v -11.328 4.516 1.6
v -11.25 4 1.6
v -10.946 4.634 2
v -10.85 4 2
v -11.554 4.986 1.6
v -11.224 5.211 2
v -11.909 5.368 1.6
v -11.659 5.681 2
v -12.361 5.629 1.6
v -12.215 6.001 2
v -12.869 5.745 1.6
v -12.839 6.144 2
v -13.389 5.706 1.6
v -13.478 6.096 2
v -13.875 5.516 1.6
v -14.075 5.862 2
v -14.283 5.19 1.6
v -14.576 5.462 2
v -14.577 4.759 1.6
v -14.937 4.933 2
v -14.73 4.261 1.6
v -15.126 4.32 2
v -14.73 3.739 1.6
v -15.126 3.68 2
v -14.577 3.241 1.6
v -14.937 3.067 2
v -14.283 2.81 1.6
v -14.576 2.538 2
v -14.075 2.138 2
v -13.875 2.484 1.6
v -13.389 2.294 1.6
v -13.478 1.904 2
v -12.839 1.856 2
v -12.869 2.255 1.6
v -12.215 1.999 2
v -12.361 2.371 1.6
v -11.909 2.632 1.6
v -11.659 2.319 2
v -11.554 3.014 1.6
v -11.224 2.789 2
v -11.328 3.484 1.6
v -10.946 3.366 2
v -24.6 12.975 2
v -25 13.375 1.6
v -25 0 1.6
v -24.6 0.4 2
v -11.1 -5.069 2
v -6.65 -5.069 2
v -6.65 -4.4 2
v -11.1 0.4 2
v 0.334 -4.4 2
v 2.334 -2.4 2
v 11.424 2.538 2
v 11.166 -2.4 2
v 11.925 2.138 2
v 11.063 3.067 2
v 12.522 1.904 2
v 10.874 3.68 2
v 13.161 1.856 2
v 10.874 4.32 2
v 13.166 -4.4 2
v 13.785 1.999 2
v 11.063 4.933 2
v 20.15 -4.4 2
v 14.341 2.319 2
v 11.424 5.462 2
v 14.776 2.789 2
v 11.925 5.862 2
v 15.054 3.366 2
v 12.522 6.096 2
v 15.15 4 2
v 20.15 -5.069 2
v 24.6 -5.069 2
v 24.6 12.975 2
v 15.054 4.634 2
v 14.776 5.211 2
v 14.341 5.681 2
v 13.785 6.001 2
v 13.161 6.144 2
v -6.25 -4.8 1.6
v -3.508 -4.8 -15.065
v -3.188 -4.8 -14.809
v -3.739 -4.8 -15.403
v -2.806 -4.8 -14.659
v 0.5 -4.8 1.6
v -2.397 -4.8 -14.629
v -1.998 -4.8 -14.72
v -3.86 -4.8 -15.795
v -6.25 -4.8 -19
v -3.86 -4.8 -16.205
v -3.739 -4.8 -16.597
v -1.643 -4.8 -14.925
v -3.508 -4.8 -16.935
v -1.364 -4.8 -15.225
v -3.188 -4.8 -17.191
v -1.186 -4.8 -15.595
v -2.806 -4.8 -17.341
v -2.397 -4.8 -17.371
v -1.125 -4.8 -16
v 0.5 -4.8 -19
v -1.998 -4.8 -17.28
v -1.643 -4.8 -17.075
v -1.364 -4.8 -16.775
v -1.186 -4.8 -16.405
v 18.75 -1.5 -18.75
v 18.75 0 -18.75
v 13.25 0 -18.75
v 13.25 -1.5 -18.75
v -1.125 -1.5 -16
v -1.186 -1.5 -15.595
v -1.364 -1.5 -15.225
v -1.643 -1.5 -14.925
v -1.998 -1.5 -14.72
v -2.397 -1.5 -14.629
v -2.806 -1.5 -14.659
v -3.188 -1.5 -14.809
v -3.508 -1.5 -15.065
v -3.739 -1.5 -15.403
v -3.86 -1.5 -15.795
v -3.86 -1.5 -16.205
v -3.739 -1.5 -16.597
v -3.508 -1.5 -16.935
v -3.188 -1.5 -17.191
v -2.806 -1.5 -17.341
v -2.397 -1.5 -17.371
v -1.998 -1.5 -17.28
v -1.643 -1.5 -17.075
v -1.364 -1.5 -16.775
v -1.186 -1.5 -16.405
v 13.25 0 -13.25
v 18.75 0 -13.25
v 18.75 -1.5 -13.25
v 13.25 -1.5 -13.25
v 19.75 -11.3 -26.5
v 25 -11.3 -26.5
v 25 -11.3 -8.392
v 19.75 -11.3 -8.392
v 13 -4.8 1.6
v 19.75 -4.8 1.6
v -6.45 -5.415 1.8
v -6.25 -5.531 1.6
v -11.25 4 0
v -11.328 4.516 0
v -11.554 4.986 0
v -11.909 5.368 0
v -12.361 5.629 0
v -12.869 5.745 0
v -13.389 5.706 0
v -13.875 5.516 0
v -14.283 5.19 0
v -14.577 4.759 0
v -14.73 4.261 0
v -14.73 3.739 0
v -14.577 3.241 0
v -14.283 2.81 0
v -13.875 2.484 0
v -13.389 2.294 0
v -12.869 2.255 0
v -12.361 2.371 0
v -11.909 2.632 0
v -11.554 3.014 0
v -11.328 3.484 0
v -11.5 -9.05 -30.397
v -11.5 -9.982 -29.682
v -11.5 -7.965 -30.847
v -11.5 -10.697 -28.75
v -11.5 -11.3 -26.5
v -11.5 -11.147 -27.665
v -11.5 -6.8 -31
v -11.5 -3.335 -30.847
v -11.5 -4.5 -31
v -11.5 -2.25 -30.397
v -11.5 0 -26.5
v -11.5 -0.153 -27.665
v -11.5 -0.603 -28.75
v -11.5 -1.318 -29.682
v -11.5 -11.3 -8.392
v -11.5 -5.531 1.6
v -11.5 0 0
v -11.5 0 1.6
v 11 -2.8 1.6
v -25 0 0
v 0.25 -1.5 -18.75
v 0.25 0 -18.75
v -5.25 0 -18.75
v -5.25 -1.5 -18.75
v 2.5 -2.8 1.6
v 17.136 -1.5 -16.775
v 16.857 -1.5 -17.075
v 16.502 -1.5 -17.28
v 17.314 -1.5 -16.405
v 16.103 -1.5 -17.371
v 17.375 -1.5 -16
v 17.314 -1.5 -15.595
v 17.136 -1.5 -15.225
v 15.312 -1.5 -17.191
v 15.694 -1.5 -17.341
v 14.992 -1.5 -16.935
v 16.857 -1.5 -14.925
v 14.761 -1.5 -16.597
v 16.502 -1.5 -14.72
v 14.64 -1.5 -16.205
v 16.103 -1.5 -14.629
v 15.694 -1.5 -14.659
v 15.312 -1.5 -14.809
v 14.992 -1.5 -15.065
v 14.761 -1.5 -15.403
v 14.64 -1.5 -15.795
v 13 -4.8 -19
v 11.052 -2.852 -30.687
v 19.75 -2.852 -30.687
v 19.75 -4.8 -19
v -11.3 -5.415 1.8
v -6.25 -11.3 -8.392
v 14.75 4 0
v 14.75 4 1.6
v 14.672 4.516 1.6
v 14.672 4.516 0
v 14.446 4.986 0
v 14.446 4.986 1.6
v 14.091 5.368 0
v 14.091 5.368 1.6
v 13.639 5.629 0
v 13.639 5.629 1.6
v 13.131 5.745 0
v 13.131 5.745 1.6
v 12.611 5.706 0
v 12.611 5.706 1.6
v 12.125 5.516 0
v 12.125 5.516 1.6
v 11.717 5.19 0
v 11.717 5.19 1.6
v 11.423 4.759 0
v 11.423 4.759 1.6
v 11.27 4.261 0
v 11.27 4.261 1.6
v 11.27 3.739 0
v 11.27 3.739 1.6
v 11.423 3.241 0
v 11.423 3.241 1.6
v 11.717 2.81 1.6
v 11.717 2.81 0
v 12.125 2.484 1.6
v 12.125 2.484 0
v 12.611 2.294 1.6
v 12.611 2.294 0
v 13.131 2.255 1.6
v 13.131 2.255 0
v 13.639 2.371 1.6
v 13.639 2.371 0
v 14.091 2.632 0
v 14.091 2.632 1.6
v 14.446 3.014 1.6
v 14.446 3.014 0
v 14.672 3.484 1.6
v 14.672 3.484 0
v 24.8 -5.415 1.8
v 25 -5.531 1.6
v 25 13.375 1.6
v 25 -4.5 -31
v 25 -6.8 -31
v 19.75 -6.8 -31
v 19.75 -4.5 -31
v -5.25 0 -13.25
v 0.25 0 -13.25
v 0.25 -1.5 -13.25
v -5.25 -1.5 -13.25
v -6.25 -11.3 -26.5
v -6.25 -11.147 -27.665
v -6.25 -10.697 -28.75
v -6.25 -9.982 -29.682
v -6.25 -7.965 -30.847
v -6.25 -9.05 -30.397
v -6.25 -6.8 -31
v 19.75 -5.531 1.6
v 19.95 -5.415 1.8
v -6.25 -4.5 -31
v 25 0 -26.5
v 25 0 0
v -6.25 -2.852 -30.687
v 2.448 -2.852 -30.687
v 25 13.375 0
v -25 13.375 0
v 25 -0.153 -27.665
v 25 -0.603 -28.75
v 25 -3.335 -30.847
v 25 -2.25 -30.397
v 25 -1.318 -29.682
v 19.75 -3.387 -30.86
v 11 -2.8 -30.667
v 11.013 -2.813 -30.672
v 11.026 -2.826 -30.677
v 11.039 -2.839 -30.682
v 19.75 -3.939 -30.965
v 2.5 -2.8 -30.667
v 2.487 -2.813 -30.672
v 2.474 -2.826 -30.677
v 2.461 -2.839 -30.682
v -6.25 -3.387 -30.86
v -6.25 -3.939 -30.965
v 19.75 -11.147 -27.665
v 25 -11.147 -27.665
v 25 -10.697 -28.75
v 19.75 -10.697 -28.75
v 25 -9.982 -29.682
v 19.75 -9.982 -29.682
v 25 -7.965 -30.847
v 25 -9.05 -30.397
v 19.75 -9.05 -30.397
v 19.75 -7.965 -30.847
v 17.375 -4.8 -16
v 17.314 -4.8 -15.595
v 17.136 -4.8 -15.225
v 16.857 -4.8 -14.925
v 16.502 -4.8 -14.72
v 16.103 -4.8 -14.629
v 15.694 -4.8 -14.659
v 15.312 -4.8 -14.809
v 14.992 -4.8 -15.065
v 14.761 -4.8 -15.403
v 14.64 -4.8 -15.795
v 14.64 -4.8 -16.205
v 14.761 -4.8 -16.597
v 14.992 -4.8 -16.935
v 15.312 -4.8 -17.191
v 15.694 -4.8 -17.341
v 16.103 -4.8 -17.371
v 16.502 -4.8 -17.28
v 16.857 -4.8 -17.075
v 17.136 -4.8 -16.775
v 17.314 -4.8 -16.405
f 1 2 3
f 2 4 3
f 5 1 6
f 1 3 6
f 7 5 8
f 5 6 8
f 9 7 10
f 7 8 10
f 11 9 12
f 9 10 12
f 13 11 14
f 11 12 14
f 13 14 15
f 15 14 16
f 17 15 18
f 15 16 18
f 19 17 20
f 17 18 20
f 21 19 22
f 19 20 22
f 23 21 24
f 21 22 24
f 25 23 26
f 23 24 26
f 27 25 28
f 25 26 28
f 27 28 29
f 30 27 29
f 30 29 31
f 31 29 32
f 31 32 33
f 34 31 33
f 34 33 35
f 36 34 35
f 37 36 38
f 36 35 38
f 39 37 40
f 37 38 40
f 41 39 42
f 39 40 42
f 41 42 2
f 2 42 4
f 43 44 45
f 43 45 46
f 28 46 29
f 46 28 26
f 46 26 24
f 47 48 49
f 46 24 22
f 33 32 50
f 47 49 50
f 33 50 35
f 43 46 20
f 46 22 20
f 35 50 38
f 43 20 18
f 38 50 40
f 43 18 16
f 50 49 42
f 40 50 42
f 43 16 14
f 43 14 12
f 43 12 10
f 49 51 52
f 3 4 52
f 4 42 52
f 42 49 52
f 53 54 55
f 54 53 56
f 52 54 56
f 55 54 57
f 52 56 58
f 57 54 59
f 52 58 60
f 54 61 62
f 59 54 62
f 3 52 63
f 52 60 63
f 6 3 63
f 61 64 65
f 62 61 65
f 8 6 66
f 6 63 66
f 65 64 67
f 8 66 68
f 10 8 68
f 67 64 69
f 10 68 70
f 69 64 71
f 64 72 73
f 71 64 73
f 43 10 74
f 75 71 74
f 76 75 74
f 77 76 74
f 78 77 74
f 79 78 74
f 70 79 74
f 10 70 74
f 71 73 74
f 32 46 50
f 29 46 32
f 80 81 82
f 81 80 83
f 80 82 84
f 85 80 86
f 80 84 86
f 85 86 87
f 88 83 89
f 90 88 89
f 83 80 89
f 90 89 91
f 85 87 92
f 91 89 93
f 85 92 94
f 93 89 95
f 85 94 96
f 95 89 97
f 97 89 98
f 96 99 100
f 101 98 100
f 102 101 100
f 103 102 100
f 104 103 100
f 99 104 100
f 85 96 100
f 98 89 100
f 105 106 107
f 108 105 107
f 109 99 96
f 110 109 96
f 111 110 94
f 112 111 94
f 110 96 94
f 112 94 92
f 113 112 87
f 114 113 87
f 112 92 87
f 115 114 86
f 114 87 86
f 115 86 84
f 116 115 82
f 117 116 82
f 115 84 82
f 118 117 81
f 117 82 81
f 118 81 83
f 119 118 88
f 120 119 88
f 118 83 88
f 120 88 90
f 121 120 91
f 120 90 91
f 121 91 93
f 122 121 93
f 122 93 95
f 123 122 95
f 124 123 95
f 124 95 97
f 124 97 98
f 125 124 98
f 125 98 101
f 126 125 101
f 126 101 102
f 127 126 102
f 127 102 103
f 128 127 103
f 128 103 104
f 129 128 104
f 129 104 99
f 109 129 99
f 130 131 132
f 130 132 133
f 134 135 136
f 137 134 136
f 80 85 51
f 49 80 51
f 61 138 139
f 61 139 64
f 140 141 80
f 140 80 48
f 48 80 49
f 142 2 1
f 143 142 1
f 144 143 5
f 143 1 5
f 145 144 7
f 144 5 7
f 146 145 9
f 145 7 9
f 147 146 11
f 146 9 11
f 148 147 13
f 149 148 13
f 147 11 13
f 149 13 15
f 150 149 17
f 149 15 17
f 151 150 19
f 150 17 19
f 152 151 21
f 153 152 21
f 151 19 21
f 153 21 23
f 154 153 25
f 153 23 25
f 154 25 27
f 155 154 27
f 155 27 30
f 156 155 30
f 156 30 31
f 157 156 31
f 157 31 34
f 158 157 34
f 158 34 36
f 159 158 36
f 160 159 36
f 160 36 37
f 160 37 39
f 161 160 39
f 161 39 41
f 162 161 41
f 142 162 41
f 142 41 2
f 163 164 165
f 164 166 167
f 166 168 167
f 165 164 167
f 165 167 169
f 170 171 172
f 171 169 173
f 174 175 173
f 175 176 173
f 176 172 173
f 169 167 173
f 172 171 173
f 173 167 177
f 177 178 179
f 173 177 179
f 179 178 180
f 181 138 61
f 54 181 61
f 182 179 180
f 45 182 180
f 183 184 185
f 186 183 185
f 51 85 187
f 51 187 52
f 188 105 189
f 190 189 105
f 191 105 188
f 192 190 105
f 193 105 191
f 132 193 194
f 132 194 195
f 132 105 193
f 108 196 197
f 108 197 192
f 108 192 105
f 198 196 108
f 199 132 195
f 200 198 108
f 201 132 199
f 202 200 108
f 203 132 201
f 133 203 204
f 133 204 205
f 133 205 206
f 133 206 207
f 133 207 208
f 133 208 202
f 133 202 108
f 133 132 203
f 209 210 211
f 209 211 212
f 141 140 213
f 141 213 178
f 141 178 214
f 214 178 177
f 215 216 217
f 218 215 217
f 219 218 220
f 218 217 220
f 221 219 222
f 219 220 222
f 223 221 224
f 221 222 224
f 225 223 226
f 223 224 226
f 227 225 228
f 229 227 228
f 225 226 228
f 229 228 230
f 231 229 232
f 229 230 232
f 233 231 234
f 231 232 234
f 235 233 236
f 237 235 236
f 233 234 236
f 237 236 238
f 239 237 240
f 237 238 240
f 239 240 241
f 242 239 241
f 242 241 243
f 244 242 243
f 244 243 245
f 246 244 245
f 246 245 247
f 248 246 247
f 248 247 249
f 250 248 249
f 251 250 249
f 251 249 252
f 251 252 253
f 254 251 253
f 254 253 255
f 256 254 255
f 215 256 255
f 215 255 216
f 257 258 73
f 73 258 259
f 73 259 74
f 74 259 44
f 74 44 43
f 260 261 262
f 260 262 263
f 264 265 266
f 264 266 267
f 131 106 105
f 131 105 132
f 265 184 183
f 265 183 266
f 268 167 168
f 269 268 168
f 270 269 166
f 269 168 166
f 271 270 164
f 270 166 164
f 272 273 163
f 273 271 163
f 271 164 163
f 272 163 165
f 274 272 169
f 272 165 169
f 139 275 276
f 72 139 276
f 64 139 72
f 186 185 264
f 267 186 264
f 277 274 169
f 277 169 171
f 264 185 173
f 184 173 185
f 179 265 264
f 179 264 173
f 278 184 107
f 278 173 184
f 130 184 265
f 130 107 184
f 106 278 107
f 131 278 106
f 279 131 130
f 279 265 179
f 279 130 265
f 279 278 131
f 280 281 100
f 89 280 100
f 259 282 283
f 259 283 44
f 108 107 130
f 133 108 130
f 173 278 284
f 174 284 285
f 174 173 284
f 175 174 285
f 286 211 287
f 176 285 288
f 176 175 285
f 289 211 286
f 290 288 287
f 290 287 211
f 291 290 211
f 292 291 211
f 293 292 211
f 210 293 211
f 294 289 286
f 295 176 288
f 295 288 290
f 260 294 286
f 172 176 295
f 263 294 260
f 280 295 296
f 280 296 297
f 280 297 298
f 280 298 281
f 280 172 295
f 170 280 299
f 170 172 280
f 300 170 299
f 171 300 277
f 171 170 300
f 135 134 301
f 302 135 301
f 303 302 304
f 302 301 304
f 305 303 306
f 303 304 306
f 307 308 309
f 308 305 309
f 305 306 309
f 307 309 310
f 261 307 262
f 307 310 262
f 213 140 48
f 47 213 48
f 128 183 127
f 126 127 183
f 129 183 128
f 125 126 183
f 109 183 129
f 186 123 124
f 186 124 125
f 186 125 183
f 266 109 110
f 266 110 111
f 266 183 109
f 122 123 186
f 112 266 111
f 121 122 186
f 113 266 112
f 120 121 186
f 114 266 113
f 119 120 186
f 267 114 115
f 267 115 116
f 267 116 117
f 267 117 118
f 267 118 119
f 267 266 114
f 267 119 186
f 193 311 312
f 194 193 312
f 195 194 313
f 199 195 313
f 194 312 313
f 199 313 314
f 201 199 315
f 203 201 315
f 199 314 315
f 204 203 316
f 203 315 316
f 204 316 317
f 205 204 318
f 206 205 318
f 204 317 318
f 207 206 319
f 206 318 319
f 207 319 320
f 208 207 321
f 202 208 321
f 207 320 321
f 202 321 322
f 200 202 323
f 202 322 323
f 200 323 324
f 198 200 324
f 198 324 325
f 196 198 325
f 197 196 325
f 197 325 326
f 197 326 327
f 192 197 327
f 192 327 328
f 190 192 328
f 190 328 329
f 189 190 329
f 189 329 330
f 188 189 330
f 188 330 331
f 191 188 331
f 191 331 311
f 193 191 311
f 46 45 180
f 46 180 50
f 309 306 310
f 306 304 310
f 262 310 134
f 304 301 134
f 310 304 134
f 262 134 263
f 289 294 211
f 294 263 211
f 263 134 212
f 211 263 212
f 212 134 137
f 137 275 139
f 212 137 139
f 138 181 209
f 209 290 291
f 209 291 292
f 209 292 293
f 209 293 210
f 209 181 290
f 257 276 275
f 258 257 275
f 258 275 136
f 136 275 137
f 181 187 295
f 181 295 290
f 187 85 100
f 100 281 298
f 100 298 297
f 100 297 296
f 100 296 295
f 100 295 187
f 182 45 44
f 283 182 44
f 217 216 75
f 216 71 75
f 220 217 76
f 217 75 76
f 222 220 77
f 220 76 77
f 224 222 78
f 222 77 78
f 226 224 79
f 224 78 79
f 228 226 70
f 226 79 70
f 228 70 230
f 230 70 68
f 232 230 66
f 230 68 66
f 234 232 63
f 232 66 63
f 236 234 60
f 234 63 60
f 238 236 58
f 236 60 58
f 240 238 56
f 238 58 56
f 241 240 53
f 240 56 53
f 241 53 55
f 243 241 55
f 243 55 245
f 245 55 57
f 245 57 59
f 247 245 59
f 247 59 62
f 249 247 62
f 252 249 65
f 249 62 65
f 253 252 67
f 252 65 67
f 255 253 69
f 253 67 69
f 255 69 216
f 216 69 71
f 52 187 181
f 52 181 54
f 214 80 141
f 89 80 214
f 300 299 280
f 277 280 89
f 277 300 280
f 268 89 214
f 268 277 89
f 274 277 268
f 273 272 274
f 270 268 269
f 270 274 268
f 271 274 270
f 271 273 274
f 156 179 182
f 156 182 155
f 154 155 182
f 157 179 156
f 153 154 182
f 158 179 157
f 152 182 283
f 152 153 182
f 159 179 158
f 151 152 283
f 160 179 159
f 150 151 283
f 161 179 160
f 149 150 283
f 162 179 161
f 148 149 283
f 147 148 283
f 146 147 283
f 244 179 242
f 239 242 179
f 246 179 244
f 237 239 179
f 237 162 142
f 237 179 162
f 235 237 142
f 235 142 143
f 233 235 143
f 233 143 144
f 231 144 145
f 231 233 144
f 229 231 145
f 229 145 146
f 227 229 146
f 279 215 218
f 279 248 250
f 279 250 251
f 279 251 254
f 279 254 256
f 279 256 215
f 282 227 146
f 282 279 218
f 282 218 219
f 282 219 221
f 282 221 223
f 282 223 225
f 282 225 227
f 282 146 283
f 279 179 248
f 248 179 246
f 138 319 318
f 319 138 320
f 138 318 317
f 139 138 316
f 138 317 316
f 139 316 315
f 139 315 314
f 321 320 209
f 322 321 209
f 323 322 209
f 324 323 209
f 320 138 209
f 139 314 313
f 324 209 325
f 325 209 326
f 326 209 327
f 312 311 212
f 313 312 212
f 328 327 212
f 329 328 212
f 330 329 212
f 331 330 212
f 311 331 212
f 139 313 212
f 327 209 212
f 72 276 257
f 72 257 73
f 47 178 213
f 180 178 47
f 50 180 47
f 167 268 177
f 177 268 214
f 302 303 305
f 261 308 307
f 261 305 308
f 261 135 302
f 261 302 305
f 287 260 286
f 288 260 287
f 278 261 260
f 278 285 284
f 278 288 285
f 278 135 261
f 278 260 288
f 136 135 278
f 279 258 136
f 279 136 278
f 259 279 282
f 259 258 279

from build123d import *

# Parameters (mm, degrees)
F0_W           = 13.375
F0_H           = 2
F1_DEPTH       = 25
F2_R           = 1.75
F3_DEPTH       = 2
F4_W           = 11.3
F4_H           = 33
F5_DEPTH       = 25
F5_DEPTH_BACK  = 11.5
F6_W           = 26
F6_H           = 6.5
F7_DEPTH       = 33
F9_DEPTH       = 33
F11_DEPTH      = 19.75
F11_DEPTH_BACK = 6.25
F12_R          = 1.375
F13_DEPTH      = 4.8
F14_W          = 5.5
F14_H          = 5.5
F15_DEPTH      = 1.5
F16_T1_DEPTH   = 27.75
F16_T3_DEPTH   = 27.75
F16_T5_DEPTH   = 59
F17_T1_DEPTH   = 59.021567647
F17_T3_DEPTH   = 59.021567647
F18_T1_DEPTH   = 6.4746360003
F18_T3_DEPTH   = 20.7323463904
F18_T5_DEPTH   = 52.0573463904
F18_T7_DEPTH   = 15.4323463904
F18_T9_DEPTH   = 14.5286731952
F18_T11_DEPTH  = 6.3286731952
F18_T13_DEPTH  = 6.4746360003
F18_T15_DEPTH  = 1.5286731952
F18_T17_DEPTH  = 7.7786731952
F18_T19_DEPTH  = 7.7786731952
F18_T24_DEPTH  = 4.8857735151
F18_T29_DEPTH  = 10.5573463904
F18_T35_DEPTH  = 4.8857735151
F18_T45_DEPTH  = 14.5286731952
F18_T49_DEPTH  = 7.3573463904
F18_T56_DEPTH  = 8.8073463904
F18_T60_DEPTH  = 2.5573463904
F18_T67_DEPTH  = 4.8857735151
F18_T71_DEPTH  = 10.5573463904
F18_T78_DEPTH  = 10.5573463904
F18_T82_DEPTH  = 4.8857735151
F18_T89_DEPTH  = 2.5573463904
F18_T93_DEPTH  = 8.8073463904


# Not quite as in the source:
# - a fillet or chamfer that OpenCascade refuses, or shapes differently, is made with other operations: its cross-section is extruded or revolved along the edge and cut away or added


with BuildPart() as f1:
    # F0 (on Right) → F1 (new body, symmetric)
    with BuildSketch(Plane.YZ):
        with Locations((6.6875, 1)):
            Rectangle(F0_W, F0_H)
    extrude(amount=F1_DEPTH, both=True)

    # F2 (on face) → F3 (cut, through all)
    with BuildSketch(Plane.XY.offset(2)):
        with Locations((-13, 4)):
            Circle(F2_R)
        with Locations((13, 4)):
            Circle(F2_R)
    extrude(amount=-F3_DEPTH, mode=Mode.SUBTRACT)

    # F4 (on Right) → F5 (join, two sides)
    with BuildSketch(Plane.YZ) as f5_sk:
        with Locations((-5.65, -14.5)):
            Rectangle(F4_W, F4_H)
    extrude(amount=F5_DEPTH)
    extrude(f5_sk.sketch, amount=-F5_DEPTH_BACK)

    # F6 (on face) → F7 (cut, through all)
    with BuildSketch(Plane(origin=(0, 0, -31), x_dir=(1, 0, 0), z_dir=(0, 0, -1))):
        with Locations((6.75, 8.05)):
            Rectangle(F6_W, F6_H)
    extrude(amount=-F7_DEPTH, mode=Mode.SUBTRACT)

    # F8 (on face) → F9 (cut, through all)
    with BuildSketch(Plane(origin=(0, 0, -31), x_dir=(1, 0, 0), z_dir=(0, 0, -1))):
        Polygon((13, 4.8), (0.5, 4.8), (2.5, 2.8), (11, 2.8), align=None)
    extrude(amount=-F9_DEPTH, mode=Mode.SUBTRACT)

    # F10 (on Right) → F11 (cut, two sides)
    with BuildSketch(Plane.YZ) as f11_sk:
        Polygon((-4.8, -31), (-2.8, -31), (-4.8, -19), align=None)
    extrude(amount=F11_DEPTH, mode=Mode.SUBTRACT)
    extrude(f11_sk.sketch, amount=-F11_DEPTH_BACK, mode=Mode.SUBTRACT)

    # F12 (on face) → F13 (cut, through all)
    with BuildSketch(Plane.XZ.offset(4.8)):
        with Locations((-2.5, -16)):
            Circle(F12_R)
        with Locations((16, -16)):
            Circle(F12_R)
    extrude(amount=-F13_DEPTH, mode=Mode.SUBTRACT)

    # F14 (on face) → F15 (cut)
    with BuildSketch(Plane(origin=(0, 0, 0), x_dir=(-1, 0, 0), z_dir=(0, 1, 0))):
        with Locations((-16, -16)):
            Rectangle(F14_W, F14_H)
        with Locations((2.5, -16)):
            Rectangle(F14_W, F14_H)
    extrude(amount=-F15_DEPTH, mode=Mode.SUBTRACT)

    # F16: fillet of radius 4.5 on 3 edges, made by hand

    # F16_s2 → F16_t1 (cut)
    with BuildSketch(Plane.YZ.offset(-22.75)):
        with BuildLine():
            ThreePointArc((-11.3, -26.5), (-9.9819805153, -29.6819805153), (-6.8, -31))
            Line((-6.8, -31), (-11.3, -31))
            Line((-11.3, -31), (-11.3, -26.5))
        make_face()
    extrude(amount=F16_T1_DEPTH, mode=Mode.SUBTRACT)

    # F16_s4 → F16_t3 (cut)
    with BuildSketch(Plane.YZ.offset(8.5)):
        with BuildLine():
            ThreePointArc((-11.3, -26.5), (-9.9819805153, -29.6819805153), (-6.8, -31))
            Line((-6.8, -31), (-11.3, -31))
            Line((-11.3, -31), (-11.3, -26.5))
        make_face()
    extrude(amount=F16_T3_DEPTH, mode=Mode.SUBTRACT)

    # F16_s6 → F16_t5 (cut)
    with BuildSketch(Plane.YZ.offset(-22.75)):
        with BuildLine():
            ThreePointArc((0, -26.5), (-1.3180194847, -29.6819805153), (-4.5, -31))
            Line((-4.5, -31), (0, -31))
            Line((0, -31), (0, -26.5))
        make_face()
    extrude(amount=F16_T5_DEPTH, mode=Mode.SUBTRACT)

    # F17: chamfer of 6 x 10.3923048454 on 2 edges, made by hand

    # F17_s2 → F17_t1 (cut)
    with BuildSketch(Plane.YZ.offset(-38.3857838235)):
        Polygon((-5.3, 2), (-11.3, -8.3923048454), (-11.3, 2), align=None)
    extrude(amount=F17_T1_DEPTH, mode=Mode.SUBTRACT)

    # F17_s4 → F17_t3 (cut)
    with BuildSketch(Plane.YZ.offset(-7.1357838235)):
        Polygon((-5.3, 2), (-11.3, -8.3923048454), (-11.3, 2), align=None)
    extrude(amount=F17_T3_DEPTH, mode=Mode.SUBTRACT)

    # F18: chamfer of 0.4 on 16 edges, made by hand

    # F18_s2 → F18_t1 (cut)
    with BuildSketch(Plane.YZ.offset(19.1376819998)):
        Polygon((-5.4154700538, 1.8), (-5.0690598923, 2), (-5.3, 2), align=None)
    extrude(amount=F18_T1_DEPTH, mode=Mode.SUBTRACT)

    # F18_s4 → F18_t3 (cut)
    with BuildSketch(Plane.XZ.offset(-14.4036731952)):
        Polygon((25, 1.6), (24.6, 2), (25, 2), align=None)
    extrude(amount=F18_T3_DEPTH, mode=Mode.SUBTRACT)

    # F18_s6 → F18_t5 (cut)
    with BuildSketch(Plane.YZ.offset(-26.0286731952)):
        Polygon((13.375, 1.6), (12.975, 2), (13.375, 2), align=None)
    extrude(amount=F18_T5_DEPTH, mode=Mode.SUBTRACT)

    # F18_s8 → F18_t7 (cut)
    with BuildSketch(Plane.XZ.offset(-14.4036731952)):
        Polygon((-25, 1.6), (-24.6, 2), (-25, 2), align=None)
    extrude(amount=F18_T7_DEPTH, mode=Mode.SUBTRACT)

    # F18_s10 → F18_t9 (cut)
    with BuildSketch(Plane.YZ.offset(-26.0286731952)):
        Polygon((0, 1.6), (0.4, 2), (0, 2), align=None)
    extrude(amount=F18_T9_DEPTH, mode=Mode.SUBTRACT)

    # F18_s12 → F18_t11 (cut)
    with BuildSketch(Plane.XZ):
        Polygon((-11.5, 1.6), (-11.1, 2), (-11.5, 2), align=None)
    extrude(amount=F18_T11_DEPTH, mode=Mode.SUBTRACT)

    # F18_s14 → F18_t13 (cut)
    with BuildSketch(Plane.YZ.offset(-12.1123180002)):
        Polygon((-5.4154700538, 1.8), (-5.0690598923, 2), (-5.3, 2), align=None)
    extrude(amount=F18_T13_DEPTH, mode=Mode.SUBTRACT)

    # F18_s16 → F18_t15 (cut)
    with BuildSketch(Plane.XZ.offset(4.8)):
        Polygon((-6.25, 1.6), (-6.65, 2), (-6.25, 2), align=None)
        Polygon((19.75, 1.6), (20.15, 2), (19.75, 2), align=None)
    extrude(amount=F18_T15_DEPTH, mode=Mode.SUBTRACT)

    # F18_s18 → F18_t17 (cut)
    with BuildSketch(Plane.YZ.offset(-6.25)):
        Polygon((-4.8, 1.6), (-4.4, 2), (-4.8, 2), align=None)
    extrude(amount=F18_T17_DEPTH, mode=Mode.SUBTRACT)

    # F18_s20 → F18_t19 (cut)
    with BuildSketch(Plane.YZ.offset(11.9713268048)):
        Polygon((-4.8, 1.6), (-4.4, 2), (-4.8, 2), align=None)
    extrude(amount=F18_T19_DEPTH, mode=Mode.SUBTRACT)


with BuildPart() as f18_tool22:
    # F18_s23 → F18_t24 (new body)
    with BuildSketch(Plane(origin=(-2.8773817919, -2.8773817919, 0), x_dir=(0, 0, 1), z_dir=(0.7071067812, 0.7071067812, 0))):
        Polygon((1.6, 3.7476659403), (2, 3.3476659403), (2, 3.7476659403), align=None)
    extrude(amount=F18_T24_DEPTH)

    split(bisect_by=Plane.XZ.offset(2.8), keep=Keep.TOP)


with BuildPart() as f1_1:
    add(f1.part)

    # F18_t21: cut F18_tool22
    add(f18_tool22.part, mode=Mode.SUBTRACT)


with BuildPart() as f18_tool27:
    # F18_s28 → F18_t29 (new body)
    with BuildSketch(Plane.YZ.offset(1.4713268048)):
        Polygon((-2.8, 1.6), (-2.4, 2), (-2.8, 2), align=None)
    extrude(amount=F18_T29_DEPTH)

    split(bisect_by=Plane(origin=(2.65, -2.65, 0), x_dir=(0, 0, 1), z_dir=(0.7071067812, -0.7071067812, 0)), keep=Keep.TOP)

    split(bisect_by=Plane(origin=(4.1, 4.1, 0), x_dir=(0, 0, 1), z_dir=(-0.7071067812, -0.7071067812, 0)), keep=Keep.TOP)


with BuildPart() as f1_2:
    add(f1_1.part)

    # F18_t26: cut F18_tool27
    add(f18_tool27.part, mode=Mode.SUBTRACT)


with BuildPart() as f18_tool33:
    # F18_s34 → F18_t35 (new body)
    with BuildSketch(Plane(origin=(6.1726182081, -6.1726182081, 0), x_dir=(0, 0, 1), z_dir=(0.7071067812, -0.7071067812, 0))):
        Polygon((1.6, -5.7982756057), (2, -6.1982756057), (2, -5.7982756057), align=None)
    extrude(amount=F18_T35_DEPTH)

    split(bisect_by=Plane.XZ.offset(2.8), keep=Keep.TOP)


with BuildPart() as f1_3:
    add(f1_2.part)

    # F18_t32: cut F18_tool33
    add(f18_tool33.part, mode=Mode.SUBTRACT)

    # F18_s37 → F18_t38 (revolve, cut)
    with BuildSketch(Plane.XZ.offset(-4)):
        Polygon((-11.25, 1.6), (-10.85, 2), (-11.25, 2), align=None)
    revolve(axis=Axis((-13, 4, 2), (0, 0, 1)), mode=Mode.SUBTRACT)

    # F18_s39 → F18_t40 (revolve, cut)
    with BuildSketch(Plane.XZ.offset(-4)):
        Polygon((14.75, 1.6), (15.15, 2), (14.75, 2), align=None)
    revolve(axis=Axis((13, 4, 2), (0, 0, 1)), mode=Mode.SUBTRACT)


with BuildPart() as f18_tool43:
    # F18_s44 → F18_t45 (new body)
    with BuildSketch(Plane.YZ.offset(-10.4713268048)):
        Polygon((0, 1.6), (0.4, 2), (0, 2), align=None)
    extrude(amount=-F18_T45_DEPTH)

    split(bisect_by=Plane.YZ.offset(-11.5), keep=Keep.TOP)


with BuildPart() as f18_tool47:
    # F18_s48 → F18_t49 (new body)
    with BuildSketch(Plane.XZ.offset(-1.0286731952)):
        Polygon((-11.5, 1.6), (-11.1, 2), (-11.5, 2), align=None)
    extrude(amount=F18_T49_DEPTH)

    split(bisect_by=Plane.XZ, keep=Keep.BOTTOM)


with BuildPart() as f18_tool43_1:
    add(f18_tool43.part)

    # F18_t51: intersect F18_tool47
    add(f18_tool47.part, mode=Mode.INTERSECT)


with BuildPart() as f1_4:
    add(f1_3.part)

    # F18_t41: cut F18_tool43
    add(f18_tool43_1.part, mode=Mode.SUBTRACT)


with BuildPart() as f18_tool54:
    # F18_s55 → F18_t56 (new body)
    with BuildSketch(Plane.YZ.offset(-7.2786731952)):
        Polygon((-4.8, 1.6), (-4.4, 2), (-4.8, 2), align=None)
    extrude(amount=F18_T56_DEPTH)

    split(bisect_by=Plane.YZ.offset(-6.25), keep=Keep.BOTTOM)


with BuildPart() as f18_tool58:
    # F18_s59 → F18_t60 (new body)
    with BuildSketch(Plane.XZ.offset(6.3286731952)):
        Polygon((-6.25, 1.6), (-6.65, 2), (-6.25, 2), align=None)
    extrude(amount=-F18_T60_DEPTH)

    split(bisect_by=Plane.XZ.offset(4.8), keep=Keep.BOTTOM)


with BuildPart() as f18_tool54_1:
    add(f18_tool54.part)

    # F18_t62: intersect F18_tool58
    add(f18_tool58.part, mode=Mode.INTERSECT)


with BuildPart() as f1_5:
    add(f1_4.part)

    # F18_t52: cut F18_tool54
    add(f18_tool54_1.part, mode=Mode.SUBTRACT)


with BuildPart() as f18_tool65:
    # F18_s66 → F18_t67 (new body)
    with BuildSketch(Plane(origin=(-2.8773817919, -2.8773817919, 0), x_dir=(0, 0, 1), z_dir=(0.7071067812, 0.7071067812, 0))):
        Polygon((1.6, 3.7476659403), (2, 3.3476659403), (2, 3.7476659403), align=None)
    extrude(amount=F18_T67_DEPTH)

    split(bisect_by=Plane.XZ.offset(2.8), keep=Keep.BOTTOM)


with BuildPart() as f18_tool69:
    # F18_s70 → F18_t71 (new body)
    with BuildSketch(Plane.YZ.offset(1.4713268048)):
        Polygon((-2.8, 1.6), (-2.4, 2), (-2.8, 2), align=None)
    extrude(amount=F18_T71_DEPTH)

    split(bisect_by=Plane(origin=(2.65, -2.65, 0), x_dir=(0, 0, 1), z_dir=(-0.7071067812, 0.7071067812, 0)), keep=Keep.TOP)


with BuildPart() as f18_tool65_1:
    add(f18_tool65.part)

    # F18_t73: intersect F18_tool69
    add(f18_tool69.part, mode=Mode.INTERSECT)


with BuildPart() as f1_6:
    add(f1_5.part)

    # F18_t63: cut F18_tool65
    add(f18_tool65_1.part, mode=Mode.SUBTRACT)


with BuildPart() as f18_tool76:
    # F18_s77 → F18_t78 (new body)
    with BuildSketch(Plane.YZ.offset(1.4713268048)):
        Polygon((-2.8, 1.6), (-2.4, 2), (-2.8, 2), align=None)
    extrude(amount=F18_T78_DEPTH)

    split(bisect_by=Plane(origin=(4.1, 4.1, 0), x_dir=(0, 0, 1), z_dir=(0.7071067812, 0.7071067812, 0)), keep=Keep.TOP)


with BuildPart() as f18_tool80:
    # F18_s81 → F18_t82 (new body)
    with BuildSketch(Plane(origin=(6.1726182081, -6.1726182081, 0), x_dir=(0, 0, 1), z_dir=(0.7071067812, -0.7071067812, 0))):
        Polygon((1.6, -5.7982756057), (2, -6.1982756057), (2, -5.7982756057), align=None)
    extrude(amount=F18_T82_DEPTH)

    split(bisect_by=Plane.XZ.offset(2.8), keep=Keep.BOTTOM)


with BuildPart() as f18_tool76_1:
    add(f18_tool76.part)

    # F18_t84: intersect F18_tool80
    add(f18_tool80.part, mode=Mode.INTERSECT)


with BuildPart() as f1_7:
    add(f1_6.part)

    # F18_t74: cut F18_tool76
    add(f18_tool76_1.part, mode=Mode.SUBTRACT)


with BuildPart() as f18_tool87:
    # F18_s88 → F18_t89 (new body)
    with BuildSketch(Plane.XZ.offset(3.7713268048)):
        Polygon((19.75, 1.6), (20.15, 2), (19.75, 2), align=None)
    extrude(amount=F18_T89_DEPTH)

    split(bisect_by=Plane.XZ.offset(4.8), keep=Keep.BOTTOM)


with BuildPart() as f18_tool91:
    # F18_s92 → F18_t93 (new body)
    with BuildSketch(Plane.YZ.offset(11.9713268048)):
        Polygon((-4.8, 1.6), (-4.4, 2), (-4.8, 2), align=None)
    extrude(amount=F18_T93_DEPTH)

    split(bisect_by=Plane.YZ.offset(19.75), keep=Keep.TOP)


with BuildPart() as f18_tool87_1:
    add(f18_tool87.part)

    # F18_t95: intersect F18_tool91
    add(f18_tool91.part, mode=Mode.INTERSECT)


with BuildPart() as f1_8:
    add(f1_7.part)

    # F18_t85: cut F18_tool87
    add(f18_tool87_1.part, mode=Mode.SUBTRACT)


solid = f1_8.part
